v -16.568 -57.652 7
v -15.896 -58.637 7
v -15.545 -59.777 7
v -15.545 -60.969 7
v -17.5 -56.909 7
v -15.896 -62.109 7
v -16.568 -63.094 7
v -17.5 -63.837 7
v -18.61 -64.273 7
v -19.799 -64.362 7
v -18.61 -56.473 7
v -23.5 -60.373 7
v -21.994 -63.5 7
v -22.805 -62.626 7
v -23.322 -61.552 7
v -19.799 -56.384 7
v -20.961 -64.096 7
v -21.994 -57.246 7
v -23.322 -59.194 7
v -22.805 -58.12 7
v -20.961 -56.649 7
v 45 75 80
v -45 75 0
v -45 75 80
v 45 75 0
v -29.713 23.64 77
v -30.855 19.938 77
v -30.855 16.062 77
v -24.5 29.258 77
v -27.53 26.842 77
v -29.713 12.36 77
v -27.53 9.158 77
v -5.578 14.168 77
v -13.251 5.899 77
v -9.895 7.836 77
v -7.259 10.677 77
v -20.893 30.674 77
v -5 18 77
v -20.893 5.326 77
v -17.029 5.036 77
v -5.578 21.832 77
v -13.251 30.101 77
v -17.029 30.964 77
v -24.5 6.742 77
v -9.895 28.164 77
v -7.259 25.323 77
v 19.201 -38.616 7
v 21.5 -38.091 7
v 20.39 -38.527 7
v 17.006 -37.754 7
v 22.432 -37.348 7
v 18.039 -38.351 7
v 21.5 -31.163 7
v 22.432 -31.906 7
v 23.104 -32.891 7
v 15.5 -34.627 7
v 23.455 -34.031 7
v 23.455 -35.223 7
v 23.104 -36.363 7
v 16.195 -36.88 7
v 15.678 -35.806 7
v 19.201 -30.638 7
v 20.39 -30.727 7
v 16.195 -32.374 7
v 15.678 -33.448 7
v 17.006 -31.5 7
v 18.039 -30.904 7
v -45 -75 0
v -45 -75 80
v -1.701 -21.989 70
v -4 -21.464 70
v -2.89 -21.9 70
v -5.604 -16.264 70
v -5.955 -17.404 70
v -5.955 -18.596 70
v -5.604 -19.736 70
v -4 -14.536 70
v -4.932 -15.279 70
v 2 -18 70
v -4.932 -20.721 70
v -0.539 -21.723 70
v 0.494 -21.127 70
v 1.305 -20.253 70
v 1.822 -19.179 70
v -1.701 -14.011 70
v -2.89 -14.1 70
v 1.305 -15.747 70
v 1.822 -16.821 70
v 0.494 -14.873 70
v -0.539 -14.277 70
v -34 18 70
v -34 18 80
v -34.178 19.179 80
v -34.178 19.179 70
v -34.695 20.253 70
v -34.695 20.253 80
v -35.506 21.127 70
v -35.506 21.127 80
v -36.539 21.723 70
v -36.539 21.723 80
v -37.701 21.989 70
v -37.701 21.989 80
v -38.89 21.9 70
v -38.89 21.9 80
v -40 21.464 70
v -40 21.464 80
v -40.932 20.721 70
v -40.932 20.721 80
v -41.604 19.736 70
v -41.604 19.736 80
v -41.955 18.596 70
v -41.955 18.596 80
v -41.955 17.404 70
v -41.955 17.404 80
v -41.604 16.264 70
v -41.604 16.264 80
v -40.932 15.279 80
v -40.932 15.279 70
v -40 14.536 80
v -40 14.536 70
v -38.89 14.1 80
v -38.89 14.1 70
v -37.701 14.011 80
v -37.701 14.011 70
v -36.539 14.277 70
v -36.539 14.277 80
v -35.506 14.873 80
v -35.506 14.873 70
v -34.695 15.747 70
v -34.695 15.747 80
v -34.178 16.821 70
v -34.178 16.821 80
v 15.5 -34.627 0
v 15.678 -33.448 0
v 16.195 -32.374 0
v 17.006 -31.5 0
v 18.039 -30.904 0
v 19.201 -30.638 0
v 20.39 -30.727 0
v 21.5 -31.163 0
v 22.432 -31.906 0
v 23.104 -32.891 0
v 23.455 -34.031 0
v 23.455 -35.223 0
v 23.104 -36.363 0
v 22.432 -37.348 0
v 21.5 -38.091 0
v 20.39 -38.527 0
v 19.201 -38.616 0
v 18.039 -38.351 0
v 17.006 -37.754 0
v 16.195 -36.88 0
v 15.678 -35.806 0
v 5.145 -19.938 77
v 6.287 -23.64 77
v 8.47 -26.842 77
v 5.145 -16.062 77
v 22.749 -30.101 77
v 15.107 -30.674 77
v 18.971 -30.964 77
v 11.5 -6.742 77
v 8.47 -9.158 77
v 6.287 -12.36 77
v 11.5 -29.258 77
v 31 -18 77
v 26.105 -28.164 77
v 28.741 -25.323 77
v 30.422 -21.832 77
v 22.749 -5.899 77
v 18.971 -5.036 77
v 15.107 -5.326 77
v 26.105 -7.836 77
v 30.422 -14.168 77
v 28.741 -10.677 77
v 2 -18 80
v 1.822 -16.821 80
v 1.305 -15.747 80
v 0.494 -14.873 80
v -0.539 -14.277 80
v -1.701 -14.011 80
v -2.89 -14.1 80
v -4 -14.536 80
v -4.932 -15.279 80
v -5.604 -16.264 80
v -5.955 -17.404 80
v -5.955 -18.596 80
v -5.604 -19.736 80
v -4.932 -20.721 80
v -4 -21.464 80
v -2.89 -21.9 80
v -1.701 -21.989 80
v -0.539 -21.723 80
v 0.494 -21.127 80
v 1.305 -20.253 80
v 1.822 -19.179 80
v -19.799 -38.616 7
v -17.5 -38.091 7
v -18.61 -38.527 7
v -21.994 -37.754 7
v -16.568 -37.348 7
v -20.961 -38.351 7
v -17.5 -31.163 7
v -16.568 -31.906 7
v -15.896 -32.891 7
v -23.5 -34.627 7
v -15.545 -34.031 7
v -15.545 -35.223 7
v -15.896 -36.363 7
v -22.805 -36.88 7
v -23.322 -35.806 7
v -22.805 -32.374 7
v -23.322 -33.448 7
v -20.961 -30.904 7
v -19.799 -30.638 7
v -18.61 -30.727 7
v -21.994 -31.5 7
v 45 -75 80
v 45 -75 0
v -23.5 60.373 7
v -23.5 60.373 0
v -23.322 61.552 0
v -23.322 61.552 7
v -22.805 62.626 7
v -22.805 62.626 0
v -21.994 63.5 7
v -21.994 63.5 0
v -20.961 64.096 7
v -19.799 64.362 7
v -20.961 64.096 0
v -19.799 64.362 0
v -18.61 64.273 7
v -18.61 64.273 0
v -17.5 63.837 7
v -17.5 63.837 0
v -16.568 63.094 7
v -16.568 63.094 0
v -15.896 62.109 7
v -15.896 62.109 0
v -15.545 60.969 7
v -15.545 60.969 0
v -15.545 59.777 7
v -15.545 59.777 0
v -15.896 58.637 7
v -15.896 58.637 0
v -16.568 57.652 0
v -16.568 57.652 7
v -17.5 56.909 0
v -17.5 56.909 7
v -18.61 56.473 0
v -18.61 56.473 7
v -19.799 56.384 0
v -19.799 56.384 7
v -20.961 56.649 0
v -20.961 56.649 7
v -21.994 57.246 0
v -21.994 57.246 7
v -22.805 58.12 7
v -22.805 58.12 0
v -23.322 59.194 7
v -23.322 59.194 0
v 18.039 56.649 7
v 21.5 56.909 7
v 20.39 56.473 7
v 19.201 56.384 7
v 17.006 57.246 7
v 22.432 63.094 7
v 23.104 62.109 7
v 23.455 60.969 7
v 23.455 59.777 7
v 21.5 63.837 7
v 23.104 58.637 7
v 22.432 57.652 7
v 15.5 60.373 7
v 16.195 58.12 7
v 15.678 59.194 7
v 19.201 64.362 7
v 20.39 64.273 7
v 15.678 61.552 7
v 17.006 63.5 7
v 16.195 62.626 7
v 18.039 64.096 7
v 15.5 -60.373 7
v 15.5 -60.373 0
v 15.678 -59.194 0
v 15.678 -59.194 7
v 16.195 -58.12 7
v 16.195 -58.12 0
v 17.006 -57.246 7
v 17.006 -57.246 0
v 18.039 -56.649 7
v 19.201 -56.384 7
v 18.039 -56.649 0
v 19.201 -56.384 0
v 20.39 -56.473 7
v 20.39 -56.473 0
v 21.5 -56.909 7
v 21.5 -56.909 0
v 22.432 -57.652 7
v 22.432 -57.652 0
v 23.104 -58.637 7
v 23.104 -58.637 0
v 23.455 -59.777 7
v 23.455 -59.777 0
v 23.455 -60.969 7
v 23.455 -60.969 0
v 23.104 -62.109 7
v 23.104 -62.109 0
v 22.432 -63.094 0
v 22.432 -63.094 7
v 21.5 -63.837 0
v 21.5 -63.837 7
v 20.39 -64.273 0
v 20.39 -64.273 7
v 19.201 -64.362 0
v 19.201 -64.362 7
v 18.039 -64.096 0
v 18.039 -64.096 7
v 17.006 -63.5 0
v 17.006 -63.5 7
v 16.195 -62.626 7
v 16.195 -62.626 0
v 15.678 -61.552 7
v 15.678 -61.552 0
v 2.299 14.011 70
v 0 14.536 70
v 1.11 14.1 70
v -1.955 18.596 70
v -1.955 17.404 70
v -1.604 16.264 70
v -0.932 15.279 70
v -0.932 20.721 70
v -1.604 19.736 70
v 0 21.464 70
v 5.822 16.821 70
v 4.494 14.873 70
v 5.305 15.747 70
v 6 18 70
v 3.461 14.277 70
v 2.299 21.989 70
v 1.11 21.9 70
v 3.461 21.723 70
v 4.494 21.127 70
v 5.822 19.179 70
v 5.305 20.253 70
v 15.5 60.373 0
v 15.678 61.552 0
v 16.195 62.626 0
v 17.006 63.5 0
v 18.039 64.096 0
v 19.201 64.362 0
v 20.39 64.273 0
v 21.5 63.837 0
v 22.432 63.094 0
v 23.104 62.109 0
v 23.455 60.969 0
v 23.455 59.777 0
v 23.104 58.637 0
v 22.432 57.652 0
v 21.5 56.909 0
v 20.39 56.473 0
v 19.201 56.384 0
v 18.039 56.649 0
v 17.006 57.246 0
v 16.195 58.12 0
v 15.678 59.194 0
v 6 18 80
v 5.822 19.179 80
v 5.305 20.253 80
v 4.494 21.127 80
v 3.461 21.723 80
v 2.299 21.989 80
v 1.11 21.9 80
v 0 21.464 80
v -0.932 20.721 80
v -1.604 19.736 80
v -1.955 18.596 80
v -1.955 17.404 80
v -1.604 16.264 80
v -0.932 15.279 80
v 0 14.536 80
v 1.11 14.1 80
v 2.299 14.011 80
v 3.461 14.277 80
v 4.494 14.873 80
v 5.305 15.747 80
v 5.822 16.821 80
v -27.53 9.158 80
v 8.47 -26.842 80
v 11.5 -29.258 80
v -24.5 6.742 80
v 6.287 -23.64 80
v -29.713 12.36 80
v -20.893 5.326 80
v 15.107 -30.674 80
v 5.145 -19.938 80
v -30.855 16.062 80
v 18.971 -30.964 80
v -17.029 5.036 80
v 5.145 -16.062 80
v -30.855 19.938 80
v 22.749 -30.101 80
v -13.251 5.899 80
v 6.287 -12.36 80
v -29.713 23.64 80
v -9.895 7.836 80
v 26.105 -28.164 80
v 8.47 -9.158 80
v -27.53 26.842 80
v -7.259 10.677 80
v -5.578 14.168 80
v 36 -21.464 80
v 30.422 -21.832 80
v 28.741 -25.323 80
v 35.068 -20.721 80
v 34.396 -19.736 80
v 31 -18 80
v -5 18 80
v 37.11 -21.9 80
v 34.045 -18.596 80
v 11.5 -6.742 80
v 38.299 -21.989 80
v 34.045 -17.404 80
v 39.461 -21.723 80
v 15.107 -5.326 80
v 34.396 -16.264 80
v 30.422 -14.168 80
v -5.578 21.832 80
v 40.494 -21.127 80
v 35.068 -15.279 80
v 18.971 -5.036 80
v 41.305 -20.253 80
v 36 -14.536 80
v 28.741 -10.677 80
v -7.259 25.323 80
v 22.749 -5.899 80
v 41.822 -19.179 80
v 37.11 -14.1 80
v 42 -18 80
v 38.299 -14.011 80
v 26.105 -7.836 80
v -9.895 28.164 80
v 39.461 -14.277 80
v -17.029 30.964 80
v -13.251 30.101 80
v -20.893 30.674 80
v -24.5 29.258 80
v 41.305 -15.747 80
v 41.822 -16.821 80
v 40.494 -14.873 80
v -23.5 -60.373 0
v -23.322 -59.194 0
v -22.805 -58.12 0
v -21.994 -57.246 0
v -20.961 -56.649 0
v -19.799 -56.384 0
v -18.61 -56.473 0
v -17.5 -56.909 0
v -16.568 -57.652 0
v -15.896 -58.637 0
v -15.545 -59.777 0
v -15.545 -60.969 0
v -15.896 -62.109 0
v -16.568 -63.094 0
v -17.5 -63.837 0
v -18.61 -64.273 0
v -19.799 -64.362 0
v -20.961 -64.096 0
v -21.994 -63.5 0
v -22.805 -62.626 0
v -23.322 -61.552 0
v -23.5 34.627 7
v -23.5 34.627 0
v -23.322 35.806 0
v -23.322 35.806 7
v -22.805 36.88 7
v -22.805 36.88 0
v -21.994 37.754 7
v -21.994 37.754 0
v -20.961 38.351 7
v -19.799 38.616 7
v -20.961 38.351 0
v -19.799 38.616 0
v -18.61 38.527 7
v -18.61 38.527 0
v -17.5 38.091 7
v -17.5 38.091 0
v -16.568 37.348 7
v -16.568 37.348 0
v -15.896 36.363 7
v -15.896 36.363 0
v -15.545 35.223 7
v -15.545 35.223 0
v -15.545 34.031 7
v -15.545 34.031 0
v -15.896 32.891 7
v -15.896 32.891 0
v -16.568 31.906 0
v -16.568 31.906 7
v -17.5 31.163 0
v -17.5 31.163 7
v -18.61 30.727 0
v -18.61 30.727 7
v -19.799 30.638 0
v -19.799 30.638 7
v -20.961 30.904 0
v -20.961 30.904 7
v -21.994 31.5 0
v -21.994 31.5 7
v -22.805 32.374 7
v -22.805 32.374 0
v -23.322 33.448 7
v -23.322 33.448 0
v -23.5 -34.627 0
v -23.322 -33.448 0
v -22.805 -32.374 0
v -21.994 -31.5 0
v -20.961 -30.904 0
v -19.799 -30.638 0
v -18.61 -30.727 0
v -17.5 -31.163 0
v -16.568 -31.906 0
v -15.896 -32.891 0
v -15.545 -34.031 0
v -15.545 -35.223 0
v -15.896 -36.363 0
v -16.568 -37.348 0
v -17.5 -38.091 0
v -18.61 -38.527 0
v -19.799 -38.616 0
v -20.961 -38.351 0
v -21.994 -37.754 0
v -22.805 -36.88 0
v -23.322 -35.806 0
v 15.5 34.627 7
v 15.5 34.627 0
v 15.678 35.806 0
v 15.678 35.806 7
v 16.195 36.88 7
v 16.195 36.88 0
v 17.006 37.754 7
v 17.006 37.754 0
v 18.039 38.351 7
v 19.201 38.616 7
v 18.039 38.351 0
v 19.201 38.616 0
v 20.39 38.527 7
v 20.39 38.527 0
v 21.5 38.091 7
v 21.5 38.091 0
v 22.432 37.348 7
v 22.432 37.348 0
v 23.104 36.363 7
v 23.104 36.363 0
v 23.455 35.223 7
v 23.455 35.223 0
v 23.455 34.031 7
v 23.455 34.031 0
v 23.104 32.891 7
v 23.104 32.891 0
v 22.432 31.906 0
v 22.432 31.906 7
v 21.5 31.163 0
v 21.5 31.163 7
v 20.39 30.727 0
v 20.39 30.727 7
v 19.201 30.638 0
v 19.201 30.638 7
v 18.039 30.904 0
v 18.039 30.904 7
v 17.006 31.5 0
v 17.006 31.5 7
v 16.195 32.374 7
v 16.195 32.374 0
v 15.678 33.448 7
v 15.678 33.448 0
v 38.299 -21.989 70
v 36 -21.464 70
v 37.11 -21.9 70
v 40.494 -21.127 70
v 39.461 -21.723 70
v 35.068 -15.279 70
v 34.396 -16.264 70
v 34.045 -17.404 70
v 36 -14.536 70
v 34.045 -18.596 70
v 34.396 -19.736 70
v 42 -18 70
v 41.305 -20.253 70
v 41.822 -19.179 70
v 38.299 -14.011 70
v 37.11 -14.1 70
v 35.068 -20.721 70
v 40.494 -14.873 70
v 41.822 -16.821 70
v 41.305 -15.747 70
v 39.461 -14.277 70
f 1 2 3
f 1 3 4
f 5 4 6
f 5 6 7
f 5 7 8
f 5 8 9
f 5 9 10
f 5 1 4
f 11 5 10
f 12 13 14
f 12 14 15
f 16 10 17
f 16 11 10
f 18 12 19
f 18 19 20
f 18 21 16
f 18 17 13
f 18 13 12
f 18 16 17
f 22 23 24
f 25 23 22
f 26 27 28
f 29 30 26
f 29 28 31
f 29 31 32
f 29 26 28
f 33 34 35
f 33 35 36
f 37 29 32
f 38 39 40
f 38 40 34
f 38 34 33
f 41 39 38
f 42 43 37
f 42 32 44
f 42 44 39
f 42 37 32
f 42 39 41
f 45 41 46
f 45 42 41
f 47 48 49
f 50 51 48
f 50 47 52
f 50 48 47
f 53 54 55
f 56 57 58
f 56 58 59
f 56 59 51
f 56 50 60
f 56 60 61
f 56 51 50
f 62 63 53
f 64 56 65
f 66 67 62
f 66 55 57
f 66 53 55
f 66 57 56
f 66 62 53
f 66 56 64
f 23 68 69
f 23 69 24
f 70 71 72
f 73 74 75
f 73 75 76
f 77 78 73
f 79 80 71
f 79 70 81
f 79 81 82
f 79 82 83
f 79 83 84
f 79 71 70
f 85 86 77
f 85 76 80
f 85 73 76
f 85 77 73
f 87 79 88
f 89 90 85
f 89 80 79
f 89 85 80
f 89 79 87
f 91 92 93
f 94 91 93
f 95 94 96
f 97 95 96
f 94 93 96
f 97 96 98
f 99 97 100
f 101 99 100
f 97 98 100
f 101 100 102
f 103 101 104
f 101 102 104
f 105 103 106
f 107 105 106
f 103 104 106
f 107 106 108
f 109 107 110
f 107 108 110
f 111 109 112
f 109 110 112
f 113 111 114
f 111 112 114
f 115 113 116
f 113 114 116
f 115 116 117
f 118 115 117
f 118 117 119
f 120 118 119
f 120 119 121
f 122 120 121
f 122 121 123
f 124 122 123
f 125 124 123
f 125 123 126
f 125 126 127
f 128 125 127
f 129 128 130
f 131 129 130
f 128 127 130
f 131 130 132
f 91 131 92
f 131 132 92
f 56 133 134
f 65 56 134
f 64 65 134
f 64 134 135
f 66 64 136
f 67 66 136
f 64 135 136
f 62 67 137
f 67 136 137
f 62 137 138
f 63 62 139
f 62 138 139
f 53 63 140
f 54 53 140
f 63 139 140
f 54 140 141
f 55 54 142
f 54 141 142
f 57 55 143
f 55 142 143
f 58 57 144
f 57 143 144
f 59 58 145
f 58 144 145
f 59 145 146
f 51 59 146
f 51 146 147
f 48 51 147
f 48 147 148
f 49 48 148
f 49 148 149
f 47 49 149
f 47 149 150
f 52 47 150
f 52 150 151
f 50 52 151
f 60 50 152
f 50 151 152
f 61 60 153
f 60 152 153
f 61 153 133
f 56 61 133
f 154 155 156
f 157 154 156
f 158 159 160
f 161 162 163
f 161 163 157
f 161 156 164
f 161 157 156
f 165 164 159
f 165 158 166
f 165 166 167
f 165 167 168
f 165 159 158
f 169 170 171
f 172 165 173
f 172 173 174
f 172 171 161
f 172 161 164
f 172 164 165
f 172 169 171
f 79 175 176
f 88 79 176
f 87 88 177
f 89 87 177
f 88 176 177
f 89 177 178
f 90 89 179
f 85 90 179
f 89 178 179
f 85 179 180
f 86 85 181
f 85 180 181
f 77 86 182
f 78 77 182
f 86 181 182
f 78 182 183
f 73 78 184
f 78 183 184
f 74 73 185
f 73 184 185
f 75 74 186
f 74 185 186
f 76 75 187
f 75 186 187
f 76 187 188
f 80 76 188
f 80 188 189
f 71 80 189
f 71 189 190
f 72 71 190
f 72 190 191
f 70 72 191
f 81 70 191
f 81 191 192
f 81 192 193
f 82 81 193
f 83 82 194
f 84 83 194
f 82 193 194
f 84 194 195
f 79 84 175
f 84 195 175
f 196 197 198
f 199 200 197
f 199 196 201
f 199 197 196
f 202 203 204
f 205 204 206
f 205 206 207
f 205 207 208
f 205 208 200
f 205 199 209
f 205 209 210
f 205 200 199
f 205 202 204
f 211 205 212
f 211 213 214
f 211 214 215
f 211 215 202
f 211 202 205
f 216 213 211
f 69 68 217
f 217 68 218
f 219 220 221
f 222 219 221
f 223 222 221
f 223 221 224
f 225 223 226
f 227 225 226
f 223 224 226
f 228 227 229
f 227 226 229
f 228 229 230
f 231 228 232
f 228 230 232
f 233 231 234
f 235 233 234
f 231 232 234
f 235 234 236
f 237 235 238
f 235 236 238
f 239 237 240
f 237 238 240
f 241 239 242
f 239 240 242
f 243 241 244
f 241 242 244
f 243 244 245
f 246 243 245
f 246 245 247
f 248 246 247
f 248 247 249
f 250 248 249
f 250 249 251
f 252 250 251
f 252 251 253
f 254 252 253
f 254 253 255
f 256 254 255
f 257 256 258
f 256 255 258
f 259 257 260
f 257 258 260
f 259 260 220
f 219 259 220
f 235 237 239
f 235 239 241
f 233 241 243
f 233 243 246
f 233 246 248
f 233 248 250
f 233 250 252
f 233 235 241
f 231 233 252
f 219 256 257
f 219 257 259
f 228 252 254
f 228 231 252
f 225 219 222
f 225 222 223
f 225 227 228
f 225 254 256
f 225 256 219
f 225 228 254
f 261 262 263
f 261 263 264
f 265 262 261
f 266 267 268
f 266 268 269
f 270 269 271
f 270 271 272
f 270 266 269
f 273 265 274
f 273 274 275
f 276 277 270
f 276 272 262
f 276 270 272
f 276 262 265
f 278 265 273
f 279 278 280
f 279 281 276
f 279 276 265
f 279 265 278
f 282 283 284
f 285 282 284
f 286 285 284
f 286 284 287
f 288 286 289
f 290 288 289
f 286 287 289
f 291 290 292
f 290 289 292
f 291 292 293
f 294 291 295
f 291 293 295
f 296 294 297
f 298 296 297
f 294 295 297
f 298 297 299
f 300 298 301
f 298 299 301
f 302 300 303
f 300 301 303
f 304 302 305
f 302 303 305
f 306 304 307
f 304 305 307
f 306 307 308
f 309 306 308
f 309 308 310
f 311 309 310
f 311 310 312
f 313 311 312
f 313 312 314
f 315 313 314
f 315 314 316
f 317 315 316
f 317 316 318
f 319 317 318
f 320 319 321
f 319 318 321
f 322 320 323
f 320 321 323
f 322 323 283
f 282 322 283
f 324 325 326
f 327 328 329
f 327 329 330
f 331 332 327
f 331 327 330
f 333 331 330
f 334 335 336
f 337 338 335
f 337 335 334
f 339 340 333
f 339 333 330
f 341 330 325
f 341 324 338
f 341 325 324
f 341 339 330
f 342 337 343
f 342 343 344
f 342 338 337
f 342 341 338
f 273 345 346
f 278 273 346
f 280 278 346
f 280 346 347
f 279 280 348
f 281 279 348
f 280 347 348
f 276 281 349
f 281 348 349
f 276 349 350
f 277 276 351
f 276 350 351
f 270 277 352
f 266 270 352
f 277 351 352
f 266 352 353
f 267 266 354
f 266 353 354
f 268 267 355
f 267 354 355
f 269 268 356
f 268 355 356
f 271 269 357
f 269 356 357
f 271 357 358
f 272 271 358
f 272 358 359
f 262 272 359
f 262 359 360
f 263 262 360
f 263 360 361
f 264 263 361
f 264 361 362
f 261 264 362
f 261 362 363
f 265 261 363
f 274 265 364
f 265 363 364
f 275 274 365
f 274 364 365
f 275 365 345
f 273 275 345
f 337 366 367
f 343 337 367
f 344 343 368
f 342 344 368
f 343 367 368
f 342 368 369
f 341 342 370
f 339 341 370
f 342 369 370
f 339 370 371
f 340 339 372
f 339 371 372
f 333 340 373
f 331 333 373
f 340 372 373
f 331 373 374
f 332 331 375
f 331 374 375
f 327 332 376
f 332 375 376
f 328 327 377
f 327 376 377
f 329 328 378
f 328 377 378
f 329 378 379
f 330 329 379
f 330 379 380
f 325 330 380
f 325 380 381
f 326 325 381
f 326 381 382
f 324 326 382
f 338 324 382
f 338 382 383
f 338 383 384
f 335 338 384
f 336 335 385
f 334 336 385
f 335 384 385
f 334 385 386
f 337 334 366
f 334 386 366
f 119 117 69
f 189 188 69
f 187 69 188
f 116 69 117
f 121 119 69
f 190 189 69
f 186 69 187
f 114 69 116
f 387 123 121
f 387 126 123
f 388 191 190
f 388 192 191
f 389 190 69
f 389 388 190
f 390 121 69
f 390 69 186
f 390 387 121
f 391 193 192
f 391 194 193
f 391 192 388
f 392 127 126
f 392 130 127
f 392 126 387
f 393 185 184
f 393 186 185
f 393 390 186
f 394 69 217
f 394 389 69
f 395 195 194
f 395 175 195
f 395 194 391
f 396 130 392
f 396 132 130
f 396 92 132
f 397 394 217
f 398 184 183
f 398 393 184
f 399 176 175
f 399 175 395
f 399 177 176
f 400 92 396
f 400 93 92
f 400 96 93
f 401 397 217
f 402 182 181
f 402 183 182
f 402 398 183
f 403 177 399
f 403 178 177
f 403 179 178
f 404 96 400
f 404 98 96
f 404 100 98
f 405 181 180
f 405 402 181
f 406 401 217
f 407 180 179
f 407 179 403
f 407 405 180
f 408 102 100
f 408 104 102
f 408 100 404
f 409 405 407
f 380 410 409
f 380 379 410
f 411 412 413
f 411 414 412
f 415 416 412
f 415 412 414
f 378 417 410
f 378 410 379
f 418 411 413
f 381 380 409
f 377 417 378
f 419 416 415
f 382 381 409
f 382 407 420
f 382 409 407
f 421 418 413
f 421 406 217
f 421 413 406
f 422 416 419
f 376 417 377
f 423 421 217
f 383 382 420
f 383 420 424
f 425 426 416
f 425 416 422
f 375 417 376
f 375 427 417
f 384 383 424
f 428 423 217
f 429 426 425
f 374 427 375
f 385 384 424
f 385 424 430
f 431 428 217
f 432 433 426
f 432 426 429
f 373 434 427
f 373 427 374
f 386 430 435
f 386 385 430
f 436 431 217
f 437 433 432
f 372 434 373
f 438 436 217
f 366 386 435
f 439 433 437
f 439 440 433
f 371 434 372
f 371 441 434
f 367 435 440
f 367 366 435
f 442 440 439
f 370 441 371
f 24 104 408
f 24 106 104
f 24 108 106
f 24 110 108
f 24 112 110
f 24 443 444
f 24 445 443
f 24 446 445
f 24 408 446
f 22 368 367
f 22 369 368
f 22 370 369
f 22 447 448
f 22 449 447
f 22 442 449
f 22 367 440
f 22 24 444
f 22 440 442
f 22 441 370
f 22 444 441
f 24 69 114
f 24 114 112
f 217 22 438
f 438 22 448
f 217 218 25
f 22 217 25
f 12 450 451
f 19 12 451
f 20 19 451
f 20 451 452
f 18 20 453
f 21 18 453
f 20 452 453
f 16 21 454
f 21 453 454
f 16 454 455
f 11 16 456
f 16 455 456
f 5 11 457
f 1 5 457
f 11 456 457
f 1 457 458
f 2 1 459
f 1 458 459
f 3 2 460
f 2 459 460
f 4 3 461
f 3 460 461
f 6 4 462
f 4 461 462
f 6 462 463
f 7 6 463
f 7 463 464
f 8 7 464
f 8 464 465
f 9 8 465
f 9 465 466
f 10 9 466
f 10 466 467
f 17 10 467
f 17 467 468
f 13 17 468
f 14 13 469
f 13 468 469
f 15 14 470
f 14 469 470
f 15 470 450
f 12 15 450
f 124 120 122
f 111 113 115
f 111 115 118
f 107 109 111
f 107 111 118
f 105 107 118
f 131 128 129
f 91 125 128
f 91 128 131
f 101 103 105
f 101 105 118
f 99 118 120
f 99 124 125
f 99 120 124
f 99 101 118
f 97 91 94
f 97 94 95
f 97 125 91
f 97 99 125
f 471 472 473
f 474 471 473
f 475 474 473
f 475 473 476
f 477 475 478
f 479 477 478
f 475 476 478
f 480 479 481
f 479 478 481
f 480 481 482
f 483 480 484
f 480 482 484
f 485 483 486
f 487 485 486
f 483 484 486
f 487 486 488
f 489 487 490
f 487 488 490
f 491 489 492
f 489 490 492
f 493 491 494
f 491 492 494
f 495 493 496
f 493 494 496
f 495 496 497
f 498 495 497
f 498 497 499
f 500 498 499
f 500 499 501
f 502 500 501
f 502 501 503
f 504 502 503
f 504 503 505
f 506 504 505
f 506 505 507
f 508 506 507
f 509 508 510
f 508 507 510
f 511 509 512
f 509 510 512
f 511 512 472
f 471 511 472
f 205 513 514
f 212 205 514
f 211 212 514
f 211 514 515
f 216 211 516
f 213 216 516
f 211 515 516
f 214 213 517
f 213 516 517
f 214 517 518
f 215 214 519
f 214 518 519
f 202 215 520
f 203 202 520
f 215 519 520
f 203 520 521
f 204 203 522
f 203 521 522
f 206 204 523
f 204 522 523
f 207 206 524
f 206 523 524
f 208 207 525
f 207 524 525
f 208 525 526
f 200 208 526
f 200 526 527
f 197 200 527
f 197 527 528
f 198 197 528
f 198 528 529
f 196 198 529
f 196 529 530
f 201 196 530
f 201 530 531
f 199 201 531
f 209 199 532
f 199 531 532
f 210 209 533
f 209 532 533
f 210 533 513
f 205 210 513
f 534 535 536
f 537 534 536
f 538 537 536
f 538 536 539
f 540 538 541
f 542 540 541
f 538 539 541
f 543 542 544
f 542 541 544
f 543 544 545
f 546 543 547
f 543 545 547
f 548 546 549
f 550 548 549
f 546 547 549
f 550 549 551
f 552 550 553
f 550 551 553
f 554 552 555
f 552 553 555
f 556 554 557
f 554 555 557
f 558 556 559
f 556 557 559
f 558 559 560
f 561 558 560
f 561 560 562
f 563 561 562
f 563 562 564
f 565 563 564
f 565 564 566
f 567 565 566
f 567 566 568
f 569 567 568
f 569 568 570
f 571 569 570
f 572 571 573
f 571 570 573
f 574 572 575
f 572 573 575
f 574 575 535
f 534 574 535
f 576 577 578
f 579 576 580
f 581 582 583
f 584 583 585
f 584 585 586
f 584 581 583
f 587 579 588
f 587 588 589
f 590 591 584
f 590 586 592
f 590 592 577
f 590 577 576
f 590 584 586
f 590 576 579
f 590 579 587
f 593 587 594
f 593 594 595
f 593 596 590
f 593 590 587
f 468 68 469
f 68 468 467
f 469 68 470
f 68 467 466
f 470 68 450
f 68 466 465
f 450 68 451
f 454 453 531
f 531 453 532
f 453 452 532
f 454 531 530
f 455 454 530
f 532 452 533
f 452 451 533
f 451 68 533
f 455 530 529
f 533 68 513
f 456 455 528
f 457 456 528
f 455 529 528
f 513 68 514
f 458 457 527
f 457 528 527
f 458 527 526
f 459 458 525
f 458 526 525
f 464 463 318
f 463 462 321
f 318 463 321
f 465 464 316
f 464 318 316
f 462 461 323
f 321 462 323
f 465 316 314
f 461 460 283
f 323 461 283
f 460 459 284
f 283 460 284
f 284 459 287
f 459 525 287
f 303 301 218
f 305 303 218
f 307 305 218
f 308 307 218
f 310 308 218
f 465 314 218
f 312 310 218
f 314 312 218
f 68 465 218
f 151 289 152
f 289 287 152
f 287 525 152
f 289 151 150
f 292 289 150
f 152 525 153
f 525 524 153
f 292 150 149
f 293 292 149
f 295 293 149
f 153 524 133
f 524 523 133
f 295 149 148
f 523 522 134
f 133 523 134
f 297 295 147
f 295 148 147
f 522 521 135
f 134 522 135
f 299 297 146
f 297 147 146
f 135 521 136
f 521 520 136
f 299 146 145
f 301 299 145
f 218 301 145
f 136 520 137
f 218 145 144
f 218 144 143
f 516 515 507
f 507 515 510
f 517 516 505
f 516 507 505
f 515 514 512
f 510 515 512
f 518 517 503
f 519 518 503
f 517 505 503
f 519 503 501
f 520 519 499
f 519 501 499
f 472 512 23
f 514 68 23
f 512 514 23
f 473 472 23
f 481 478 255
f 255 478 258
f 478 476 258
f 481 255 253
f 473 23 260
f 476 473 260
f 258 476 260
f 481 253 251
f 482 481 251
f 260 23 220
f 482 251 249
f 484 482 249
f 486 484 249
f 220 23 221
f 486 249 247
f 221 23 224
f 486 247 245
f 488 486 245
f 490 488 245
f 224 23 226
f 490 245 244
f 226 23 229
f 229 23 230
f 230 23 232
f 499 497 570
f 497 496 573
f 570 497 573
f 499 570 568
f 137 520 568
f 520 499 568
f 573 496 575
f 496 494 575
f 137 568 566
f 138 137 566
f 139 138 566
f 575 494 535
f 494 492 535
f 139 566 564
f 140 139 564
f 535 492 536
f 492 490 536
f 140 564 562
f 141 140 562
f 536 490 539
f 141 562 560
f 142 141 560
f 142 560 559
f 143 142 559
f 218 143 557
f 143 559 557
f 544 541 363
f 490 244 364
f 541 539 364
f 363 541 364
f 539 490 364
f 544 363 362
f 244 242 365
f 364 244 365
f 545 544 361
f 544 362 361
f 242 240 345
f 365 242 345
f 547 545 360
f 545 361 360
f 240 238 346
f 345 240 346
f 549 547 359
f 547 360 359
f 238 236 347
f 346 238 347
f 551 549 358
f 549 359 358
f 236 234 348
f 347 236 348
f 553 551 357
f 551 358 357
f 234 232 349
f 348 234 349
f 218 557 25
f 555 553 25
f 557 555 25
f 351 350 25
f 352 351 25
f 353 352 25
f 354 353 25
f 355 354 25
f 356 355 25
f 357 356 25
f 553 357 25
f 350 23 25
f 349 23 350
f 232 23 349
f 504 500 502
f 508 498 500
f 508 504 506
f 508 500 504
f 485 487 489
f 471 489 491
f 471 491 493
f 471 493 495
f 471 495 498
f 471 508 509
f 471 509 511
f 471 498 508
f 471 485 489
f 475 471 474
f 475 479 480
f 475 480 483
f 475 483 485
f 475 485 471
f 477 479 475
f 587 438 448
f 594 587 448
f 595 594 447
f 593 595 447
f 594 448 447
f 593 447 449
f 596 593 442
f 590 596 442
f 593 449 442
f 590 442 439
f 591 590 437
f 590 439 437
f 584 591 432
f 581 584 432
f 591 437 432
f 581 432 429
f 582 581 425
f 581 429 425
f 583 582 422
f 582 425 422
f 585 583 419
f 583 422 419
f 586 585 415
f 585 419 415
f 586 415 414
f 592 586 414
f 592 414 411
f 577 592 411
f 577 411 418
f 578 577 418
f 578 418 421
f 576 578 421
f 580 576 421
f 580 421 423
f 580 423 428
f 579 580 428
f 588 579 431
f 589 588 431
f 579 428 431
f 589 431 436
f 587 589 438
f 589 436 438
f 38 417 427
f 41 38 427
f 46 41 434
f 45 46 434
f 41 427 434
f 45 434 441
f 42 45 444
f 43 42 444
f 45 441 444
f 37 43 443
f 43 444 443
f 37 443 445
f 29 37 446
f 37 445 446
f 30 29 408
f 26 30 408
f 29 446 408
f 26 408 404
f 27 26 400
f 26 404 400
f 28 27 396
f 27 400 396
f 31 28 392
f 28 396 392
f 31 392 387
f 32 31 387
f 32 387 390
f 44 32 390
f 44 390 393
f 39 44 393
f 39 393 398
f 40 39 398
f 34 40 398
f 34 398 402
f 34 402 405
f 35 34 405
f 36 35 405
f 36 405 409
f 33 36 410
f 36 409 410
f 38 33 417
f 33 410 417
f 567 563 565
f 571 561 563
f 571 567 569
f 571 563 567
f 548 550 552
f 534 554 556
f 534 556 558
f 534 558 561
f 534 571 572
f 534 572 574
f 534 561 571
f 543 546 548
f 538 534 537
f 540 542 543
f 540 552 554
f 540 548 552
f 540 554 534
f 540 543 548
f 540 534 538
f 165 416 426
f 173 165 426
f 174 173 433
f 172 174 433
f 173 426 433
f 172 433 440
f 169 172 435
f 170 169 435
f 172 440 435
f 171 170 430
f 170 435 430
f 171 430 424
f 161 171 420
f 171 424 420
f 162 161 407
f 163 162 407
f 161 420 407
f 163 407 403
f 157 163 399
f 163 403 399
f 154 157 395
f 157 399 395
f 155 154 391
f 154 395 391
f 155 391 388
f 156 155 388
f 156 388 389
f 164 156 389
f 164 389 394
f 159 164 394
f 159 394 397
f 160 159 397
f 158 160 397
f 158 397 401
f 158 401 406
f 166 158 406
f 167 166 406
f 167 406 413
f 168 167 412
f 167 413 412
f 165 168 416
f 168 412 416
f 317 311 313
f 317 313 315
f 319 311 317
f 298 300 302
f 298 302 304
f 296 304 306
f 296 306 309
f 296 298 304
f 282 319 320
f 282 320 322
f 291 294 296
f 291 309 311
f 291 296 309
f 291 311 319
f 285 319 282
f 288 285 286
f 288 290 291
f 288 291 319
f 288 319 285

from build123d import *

# Parameters (mm, degrees)
SKETCH_1_W          = 90
SKETCH_1_H          = 150
EXTRUDE_1_DEPTH     = 80
SKETCH_2_R          = 13
CUT_EXTRUDE_1_DEPTH = 3
SKETCH_3_R          = 4
CUT_EXTRUDE_2_DEPTH = 10
SKETCH_4_R          = 4
CUT_EXTRUDE_3_DEPTH = 7


with BuildPart() as part:
    # 草图1 → 凸台-拉伸1 (new body)
    with BuildSketch(Plane.XY):
        Rectangle(SKETCH_1_W, SKETCH_1_H)
    extrude(amount=EXTRUDE_1_DEPTH)

    # 草图2 → 切除-拉伸1 (cut)
    with BuildSketch(Plane.XY.offset(80)):
        with Locations((18, -18)):
            Circle(SKETCH_2_R)
        with Locations((-18, 18)):
            Circle(SKETCH_2_R)
    extrude(amount=-CUT_EXTRUDE_1_DEPTH, mode=Mode.SUBTRACT)

    # 草图3 → 切除-拉伸2 (cut)
    with BuildSketch(Plane.XY.offset(80)):
        with Locations((2, 18)):
            Circle(SKETCH_3_R)
        with Locations((-38, 18)):
            Circle(SKETCH_3_R)
        with Locations((-2, -18)):
            Circle(SKETCH_3_R)
        with Locations((38, -18)):
            Circle(SKETCH_3_R)
    extrude(amount=-CUT_EXTRUDE_2_DEPTH, mode=Mode.SUBTRACT)

    # 草图4 → 切除-拉伸3 (cut)
    with BuildSketch(Plane(origin=(0, 0, 0), x_dir=(-1, 0, 0), z_dir=(0, 0, -1))):
        with Locations((-19.5, 60.372983346)):
            Circle(SKETCH_4_R)
        with Locations((-19.5, -34.627016654)):
            Circle(SKETCH_4_R)
        with Locations((19.5, -34.627016654)):
            Circle(SKETCH_4_R)
        with Locations((-19.5, 34.627016654)):
            Circle(SKETCH_4_R)
        with Locations((-19.5, -60.372983346)):
            Circle(SKETCH_4_R)
        with Locations((19.5, -60.372983346)):
            Circle(SKETCH_4_R)
        with Locations((19.5, 34.627016654)):
            Circle(SKETCH_4_R)
        with Locations((19.5, 60.372983346)):
            Circle(SKETCH_4_R)
    extrude(amount=-CUT_EXTRUDE_3_DEPTH, mode=Mode.SUBTRACT)


solid = part.part
